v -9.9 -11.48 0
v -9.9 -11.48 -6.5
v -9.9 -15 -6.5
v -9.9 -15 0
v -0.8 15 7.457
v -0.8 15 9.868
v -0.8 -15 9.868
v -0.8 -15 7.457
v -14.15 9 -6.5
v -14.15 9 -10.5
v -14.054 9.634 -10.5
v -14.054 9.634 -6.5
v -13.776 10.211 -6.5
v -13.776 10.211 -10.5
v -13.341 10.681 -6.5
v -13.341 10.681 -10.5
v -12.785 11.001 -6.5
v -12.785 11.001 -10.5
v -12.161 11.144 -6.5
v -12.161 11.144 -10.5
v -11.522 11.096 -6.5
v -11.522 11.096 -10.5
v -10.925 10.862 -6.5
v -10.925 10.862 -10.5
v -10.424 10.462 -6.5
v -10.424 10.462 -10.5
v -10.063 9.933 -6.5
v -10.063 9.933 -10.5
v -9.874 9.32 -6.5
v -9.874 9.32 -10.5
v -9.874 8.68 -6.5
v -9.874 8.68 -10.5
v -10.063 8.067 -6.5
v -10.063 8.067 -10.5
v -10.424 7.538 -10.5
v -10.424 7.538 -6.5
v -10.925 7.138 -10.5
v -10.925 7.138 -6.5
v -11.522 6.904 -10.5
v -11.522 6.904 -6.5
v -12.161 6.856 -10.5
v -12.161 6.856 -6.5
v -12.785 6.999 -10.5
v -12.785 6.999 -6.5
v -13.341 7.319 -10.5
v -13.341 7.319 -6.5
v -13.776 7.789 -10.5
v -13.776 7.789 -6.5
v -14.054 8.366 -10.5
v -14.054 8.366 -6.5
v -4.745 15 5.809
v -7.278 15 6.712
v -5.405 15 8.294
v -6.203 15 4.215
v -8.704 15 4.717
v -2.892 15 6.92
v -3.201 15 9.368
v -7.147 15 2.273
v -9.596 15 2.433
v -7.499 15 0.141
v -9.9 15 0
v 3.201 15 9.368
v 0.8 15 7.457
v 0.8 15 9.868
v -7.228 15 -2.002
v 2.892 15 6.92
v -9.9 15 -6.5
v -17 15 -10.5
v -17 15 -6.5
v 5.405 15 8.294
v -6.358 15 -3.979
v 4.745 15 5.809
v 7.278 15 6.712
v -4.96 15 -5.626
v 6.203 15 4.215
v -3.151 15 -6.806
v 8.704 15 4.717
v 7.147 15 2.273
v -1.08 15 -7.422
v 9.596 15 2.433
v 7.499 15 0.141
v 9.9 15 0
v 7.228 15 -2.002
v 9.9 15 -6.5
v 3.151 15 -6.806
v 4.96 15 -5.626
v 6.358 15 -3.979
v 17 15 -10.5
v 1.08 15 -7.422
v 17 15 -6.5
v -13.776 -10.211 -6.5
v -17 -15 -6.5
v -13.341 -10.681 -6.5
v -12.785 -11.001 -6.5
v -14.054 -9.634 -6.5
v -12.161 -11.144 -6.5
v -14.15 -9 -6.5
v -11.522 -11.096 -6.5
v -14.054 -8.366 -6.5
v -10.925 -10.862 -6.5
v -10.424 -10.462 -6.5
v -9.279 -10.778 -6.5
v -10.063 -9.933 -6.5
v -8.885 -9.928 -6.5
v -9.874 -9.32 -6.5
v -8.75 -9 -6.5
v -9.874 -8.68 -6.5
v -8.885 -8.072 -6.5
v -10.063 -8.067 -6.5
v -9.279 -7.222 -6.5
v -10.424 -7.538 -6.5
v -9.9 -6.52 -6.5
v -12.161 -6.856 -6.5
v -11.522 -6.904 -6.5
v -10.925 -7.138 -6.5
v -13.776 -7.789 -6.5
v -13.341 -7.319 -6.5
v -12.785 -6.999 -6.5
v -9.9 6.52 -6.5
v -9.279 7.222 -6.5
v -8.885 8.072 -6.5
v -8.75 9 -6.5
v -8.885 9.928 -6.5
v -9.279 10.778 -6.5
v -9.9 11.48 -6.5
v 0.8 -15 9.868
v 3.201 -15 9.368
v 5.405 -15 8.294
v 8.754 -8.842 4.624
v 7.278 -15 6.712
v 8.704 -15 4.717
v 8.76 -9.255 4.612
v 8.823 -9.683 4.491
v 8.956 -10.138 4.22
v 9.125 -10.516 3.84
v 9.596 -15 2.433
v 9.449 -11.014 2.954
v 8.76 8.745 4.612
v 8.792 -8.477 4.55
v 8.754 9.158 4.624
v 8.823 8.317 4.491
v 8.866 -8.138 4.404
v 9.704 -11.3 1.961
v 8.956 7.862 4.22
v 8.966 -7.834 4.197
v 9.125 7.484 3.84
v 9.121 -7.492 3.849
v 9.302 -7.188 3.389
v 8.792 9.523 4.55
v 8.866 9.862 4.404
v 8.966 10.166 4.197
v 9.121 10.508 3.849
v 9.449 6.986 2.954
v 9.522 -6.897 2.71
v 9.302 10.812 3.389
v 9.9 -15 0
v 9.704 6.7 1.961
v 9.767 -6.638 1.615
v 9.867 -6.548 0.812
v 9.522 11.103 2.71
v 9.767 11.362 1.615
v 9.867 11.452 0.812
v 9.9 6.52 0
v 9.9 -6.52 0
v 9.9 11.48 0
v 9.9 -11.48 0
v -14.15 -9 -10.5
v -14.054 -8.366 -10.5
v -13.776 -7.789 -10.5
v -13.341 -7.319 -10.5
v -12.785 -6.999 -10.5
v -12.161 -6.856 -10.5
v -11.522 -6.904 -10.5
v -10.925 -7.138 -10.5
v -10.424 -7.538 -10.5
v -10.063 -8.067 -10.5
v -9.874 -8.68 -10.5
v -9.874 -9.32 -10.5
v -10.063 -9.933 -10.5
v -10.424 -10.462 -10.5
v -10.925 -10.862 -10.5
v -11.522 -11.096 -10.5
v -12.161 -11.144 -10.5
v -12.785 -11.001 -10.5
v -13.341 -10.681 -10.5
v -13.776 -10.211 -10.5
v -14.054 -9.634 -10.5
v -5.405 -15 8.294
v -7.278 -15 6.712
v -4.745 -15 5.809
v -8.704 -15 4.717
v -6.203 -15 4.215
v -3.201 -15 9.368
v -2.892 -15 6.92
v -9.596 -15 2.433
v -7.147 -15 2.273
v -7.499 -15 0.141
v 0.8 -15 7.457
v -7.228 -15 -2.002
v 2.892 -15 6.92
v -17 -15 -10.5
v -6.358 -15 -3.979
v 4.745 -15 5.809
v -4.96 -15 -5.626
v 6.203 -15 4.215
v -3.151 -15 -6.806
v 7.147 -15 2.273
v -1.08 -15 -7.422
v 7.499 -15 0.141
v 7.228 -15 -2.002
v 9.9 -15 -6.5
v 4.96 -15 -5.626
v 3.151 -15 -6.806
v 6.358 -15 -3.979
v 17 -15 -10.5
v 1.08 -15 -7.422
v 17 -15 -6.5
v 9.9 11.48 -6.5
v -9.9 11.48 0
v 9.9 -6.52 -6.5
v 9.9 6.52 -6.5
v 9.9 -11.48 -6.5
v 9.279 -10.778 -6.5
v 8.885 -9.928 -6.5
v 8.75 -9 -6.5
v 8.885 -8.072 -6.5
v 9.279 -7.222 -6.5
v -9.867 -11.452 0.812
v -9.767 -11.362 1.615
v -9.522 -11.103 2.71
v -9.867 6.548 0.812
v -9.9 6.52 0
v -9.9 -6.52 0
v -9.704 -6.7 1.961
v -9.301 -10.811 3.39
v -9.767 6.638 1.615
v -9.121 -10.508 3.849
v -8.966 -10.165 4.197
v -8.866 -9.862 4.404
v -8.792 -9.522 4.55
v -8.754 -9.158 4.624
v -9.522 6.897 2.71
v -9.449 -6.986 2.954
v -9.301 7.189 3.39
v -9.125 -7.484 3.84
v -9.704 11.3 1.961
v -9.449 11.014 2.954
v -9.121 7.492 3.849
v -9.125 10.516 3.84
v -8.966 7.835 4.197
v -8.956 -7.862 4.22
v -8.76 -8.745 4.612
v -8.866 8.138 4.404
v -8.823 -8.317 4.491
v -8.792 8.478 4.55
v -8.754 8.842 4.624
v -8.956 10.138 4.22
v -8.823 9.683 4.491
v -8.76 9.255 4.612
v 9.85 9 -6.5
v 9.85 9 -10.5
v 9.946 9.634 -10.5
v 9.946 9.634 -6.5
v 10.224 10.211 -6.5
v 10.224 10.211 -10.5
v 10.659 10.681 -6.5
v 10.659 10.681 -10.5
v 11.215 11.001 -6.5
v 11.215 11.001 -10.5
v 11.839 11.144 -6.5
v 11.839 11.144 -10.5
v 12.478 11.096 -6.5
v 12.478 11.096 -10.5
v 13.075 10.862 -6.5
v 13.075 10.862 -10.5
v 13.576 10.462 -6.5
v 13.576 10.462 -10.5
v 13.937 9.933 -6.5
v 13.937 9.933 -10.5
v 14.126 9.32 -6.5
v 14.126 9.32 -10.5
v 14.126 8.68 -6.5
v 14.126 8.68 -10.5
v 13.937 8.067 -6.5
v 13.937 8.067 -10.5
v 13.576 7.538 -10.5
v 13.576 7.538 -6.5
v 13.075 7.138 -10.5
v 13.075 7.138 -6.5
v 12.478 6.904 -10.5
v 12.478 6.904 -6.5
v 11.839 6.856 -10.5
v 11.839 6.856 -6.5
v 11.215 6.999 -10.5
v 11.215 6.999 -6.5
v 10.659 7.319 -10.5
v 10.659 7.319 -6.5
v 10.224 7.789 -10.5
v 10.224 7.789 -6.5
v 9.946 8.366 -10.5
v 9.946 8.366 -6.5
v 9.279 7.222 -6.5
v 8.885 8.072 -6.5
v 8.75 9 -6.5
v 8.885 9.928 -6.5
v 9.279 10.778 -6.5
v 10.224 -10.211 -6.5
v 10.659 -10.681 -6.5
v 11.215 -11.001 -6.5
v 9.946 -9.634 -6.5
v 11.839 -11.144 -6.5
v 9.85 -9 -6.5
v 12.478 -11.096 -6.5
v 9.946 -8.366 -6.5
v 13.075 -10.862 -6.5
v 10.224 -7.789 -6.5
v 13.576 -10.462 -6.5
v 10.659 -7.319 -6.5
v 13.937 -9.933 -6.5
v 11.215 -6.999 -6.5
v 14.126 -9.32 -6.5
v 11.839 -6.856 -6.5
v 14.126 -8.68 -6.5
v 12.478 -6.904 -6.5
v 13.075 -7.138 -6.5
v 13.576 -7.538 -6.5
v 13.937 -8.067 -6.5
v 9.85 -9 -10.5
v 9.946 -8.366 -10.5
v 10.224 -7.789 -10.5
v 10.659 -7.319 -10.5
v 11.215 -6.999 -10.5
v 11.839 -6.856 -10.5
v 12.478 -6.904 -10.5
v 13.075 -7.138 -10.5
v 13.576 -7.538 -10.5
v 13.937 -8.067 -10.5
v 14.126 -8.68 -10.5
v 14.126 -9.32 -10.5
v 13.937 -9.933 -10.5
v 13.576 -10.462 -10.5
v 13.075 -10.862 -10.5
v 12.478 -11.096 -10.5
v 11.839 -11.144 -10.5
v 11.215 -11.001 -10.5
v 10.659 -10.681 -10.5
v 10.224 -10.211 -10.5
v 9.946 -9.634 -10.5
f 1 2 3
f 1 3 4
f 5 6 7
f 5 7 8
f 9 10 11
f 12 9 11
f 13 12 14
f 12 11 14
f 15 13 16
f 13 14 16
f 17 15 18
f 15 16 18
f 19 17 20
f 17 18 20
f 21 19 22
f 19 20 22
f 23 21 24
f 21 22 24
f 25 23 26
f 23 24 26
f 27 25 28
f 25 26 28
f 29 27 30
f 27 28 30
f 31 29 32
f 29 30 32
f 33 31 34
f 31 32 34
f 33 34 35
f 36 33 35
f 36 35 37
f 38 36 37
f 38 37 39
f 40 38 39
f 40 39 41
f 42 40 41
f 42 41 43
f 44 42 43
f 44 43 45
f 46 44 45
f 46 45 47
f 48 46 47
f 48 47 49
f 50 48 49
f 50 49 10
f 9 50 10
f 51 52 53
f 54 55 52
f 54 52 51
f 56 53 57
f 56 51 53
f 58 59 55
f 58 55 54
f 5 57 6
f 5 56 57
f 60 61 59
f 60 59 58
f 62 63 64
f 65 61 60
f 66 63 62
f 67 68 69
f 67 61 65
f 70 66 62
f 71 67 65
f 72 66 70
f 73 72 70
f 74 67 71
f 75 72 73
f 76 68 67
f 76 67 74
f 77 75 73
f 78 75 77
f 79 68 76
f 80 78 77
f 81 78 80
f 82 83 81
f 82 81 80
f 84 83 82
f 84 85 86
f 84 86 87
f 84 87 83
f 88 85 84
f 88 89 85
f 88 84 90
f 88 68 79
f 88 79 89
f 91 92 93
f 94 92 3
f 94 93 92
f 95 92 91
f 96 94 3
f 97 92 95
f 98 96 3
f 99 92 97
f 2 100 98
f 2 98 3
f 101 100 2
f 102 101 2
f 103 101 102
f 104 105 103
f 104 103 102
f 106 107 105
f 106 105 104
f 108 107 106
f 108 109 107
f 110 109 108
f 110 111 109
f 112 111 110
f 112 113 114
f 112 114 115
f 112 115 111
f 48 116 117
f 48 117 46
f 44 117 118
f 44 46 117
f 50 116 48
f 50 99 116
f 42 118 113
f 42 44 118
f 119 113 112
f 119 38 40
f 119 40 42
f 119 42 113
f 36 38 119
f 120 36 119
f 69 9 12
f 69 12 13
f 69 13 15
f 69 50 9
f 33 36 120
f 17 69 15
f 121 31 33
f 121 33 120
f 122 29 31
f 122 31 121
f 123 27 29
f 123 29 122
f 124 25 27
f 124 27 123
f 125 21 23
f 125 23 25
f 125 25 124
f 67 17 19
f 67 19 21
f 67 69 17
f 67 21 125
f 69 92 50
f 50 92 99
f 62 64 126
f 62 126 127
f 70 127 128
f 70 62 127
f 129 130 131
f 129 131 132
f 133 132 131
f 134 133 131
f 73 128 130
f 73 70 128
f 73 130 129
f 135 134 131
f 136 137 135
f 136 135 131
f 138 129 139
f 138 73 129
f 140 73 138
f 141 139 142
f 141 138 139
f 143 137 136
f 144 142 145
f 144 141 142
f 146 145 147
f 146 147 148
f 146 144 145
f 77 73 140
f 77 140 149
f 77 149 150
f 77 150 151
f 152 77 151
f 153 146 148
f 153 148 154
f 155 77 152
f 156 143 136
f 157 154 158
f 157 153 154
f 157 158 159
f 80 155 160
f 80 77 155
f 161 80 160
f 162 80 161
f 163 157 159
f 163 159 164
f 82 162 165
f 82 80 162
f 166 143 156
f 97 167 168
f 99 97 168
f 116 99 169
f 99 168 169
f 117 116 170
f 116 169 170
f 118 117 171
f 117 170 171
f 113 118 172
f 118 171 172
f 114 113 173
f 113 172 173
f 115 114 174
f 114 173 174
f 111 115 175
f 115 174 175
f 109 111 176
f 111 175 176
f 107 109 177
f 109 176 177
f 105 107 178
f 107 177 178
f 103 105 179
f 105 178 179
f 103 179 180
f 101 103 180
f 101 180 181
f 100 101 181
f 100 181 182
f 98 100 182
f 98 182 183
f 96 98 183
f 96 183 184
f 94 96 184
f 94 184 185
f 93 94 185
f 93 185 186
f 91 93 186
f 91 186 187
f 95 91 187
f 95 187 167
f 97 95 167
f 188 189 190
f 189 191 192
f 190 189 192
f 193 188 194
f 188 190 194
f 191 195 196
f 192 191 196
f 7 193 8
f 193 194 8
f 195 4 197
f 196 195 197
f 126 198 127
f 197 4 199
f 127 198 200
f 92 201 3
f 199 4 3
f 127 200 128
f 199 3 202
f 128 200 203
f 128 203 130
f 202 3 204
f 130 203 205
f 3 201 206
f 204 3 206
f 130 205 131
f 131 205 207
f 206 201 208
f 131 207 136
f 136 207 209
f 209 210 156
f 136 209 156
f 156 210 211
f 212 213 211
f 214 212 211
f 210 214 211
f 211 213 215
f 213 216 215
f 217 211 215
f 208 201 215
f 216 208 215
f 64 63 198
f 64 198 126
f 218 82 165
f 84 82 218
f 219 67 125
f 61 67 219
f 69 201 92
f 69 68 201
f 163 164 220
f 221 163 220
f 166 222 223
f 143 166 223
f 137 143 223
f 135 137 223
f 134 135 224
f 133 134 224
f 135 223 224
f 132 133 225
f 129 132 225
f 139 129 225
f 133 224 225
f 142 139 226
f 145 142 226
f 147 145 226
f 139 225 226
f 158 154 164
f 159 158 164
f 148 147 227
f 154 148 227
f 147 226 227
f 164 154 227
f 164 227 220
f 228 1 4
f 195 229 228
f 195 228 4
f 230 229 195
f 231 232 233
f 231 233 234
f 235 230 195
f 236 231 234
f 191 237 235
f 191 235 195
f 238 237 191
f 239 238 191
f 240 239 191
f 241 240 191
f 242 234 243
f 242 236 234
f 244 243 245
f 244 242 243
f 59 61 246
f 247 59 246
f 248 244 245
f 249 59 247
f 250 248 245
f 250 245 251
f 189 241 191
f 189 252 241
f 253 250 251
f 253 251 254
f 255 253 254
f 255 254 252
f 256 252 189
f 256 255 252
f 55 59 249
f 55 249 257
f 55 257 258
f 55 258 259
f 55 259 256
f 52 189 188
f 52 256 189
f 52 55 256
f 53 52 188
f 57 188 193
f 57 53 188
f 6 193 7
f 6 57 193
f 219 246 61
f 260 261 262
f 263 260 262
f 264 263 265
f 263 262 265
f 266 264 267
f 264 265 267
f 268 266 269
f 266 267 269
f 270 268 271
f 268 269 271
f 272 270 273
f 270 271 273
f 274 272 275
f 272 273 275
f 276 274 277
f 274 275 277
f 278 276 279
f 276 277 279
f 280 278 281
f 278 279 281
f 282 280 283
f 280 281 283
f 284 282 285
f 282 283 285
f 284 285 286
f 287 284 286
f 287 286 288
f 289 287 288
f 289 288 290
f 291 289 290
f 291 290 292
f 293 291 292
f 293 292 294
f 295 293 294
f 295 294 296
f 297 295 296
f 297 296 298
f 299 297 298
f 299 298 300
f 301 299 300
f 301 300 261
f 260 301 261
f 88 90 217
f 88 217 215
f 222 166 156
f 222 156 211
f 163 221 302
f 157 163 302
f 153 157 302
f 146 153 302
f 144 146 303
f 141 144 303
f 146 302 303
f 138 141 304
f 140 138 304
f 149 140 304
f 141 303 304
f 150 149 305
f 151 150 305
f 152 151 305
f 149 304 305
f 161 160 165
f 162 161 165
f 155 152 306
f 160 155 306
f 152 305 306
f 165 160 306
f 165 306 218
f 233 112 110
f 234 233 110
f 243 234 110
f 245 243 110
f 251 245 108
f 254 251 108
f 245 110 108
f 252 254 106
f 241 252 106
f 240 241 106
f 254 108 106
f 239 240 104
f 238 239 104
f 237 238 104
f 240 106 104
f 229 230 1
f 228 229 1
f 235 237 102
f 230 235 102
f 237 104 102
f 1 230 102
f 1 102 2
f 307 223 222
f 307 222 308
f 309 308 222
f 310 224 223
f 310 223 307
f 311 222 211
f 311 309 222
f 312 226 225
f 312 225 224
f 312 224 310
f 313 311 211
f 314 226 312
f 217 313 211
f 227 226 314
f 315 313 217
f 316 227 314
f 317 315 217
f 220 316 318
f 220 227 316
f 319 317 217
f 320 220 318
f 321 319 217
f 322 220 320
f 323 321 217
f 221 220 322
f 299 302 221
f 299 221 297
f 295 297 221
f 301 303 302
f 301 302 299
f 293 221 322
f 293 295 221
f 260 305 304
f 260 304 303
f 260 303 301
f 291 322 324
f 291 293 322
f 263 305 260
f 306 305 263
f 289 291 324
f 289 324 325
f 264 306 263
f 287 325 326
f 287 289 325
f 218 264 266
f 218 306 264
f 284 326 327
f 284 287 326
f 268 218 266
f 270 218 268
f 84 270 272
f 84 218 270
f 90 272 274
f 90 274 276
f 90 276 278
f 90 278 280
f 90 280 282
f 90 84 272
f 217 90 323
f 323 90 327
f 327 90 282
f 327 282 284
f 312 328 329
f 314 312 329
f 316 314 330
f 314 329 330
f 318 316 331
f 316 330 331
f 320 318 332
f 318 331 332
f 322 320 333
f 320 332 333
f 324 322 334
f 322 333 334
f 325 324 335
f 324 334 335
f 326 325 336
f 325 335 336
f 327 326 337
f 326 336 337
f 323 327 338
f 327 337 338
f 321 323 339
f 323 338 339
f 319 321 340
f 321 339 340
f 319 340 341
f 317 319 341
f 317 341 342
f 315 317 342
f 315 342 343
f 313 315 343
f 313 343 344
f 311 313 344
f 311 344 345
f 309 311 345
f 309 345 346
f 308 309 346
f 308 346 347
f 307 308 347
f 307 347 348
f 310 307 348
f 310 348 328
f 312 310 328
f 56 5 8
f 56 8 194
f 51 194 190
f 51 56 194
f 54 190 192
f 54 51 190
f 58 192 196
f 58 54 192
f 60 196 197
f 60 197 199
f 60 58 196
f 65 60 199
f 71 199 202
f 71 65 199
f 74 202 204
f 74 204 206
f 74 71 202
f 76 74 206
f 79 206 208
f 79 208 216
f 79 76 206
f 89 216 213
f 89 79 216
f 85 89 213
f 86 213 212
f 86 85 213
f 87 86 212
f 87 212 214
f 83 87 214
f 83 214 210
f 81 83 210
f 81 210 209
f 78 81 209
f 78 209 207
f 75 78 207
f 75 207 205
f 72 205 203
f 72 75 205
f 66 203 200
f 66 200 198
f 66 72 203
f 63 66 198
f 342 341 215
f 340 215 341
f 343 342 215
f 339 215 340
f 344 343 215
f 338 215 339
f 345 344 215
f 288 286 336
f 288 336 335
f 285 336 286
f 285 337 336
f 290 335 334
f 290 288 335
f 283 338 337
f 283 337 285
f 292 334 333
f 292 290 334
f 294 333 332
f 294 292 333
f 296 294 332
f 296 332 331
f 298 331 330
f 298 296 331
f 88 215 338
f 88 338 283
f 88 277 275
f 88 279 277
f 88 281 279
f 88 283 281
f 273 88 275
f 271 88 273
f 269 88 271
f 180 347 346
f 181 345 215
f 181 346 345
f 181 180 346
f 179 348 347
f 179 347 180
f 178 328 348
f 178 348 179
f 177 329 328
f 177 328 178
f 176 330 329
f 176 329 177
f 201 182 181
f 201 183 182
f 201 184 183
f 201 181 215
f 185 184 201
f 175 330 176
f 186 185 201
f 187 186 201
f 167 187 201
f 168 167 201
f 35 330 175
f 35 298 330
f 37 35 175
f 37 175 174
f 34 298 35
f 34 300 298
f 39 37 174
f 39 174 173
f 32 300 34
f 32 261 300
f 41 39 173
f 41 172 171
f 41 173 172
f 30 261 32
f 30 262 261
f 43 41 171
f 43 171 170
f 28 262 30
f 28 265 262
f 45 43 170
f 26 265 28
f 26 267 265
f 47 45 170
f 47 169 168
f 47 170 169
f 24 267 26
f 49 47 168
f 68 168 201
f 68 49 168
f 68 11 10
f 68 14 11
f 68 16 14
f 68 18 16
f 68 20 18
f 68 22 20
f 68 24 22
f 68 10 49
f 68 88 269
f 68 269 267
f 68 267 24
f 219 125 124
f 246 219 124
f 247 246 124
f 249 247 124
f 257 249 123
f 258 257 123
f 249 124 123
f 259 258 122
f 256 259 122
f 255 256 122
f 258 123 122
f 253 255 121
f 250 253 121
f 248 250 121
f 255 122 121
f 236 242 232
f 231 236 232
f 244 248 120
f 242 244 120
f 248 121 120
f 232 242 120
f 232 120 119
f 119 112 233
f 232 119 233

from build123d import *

# Parameters (mm, degrees)
BOSS_EXTRUDE1_DEPTH      = 15
BOSS_EXTRUDE1_DEPTH_BACK = 15
CUT_EXTRUDE1_REACH       = 22.368
SKETCH2_R                = 2.15
CUT_EXTRUDE2_REACH       = 26.368
CUT_EXTRUDE2_START       = -4
SKETCH3_R                = 3.25


with BuildPart() as part:
    # Sketch1 → Boss-Extrude1 (new body, two sides)
    with BuildSketch(Plane(origin=(0, 0, 0), x_dir=(1, 0, 0), z_dir=(0, 1, 0))) as boss_extrude1_sk:
        with BuildLine():
            Line((-9.9, 6.5), (-9.9, 0))
            ThreePointArc((-9.9, 0), (-7.277705682, -6.711557196), (-0.8, -9.867623827))
            Line((-0.8, -9.867623827), (-0.8, -7.457211275))
            ThreePointArc((-0.8, -7.457211275), (0, 7.5), (0.8, -7.457211275))
            Line((0.8, -7.457211275), (0.8, -9.867623827))
            ThreePointArc((0.8, -9.867623827), (7.277705682, -6.711557196), (9.9, 0))
            Line((9.9, 0), (9.9, 6.5))
            Line((9.9, 6.5), (17, 6.5))
            Line((17, 6.5), (17, 10.5))
            Line((17, 10.5), (-17, 10.5))
            Line((-17, 10.5), (-17, 6.5))
            Line((-17, 6.5), (-9.9, 6.5))
        make_face()
    extrude(amount=BOSS_EXTRUDE1_DEPTH)
    extrude(boss_extrude1_sk.sketch, amount=-BOSS_EXTRUDE1_DEPTH_BACK)

    # Sketch2 → Cut-Extrude1 (cut, up to next)
    with BuildSketch(Plane(origin=(0, 0, -10.5), x_dir=(-1, 0, 0), z_dir=(0, 0, -1)), mode=Mode.PRIVATE) as cut_extrude1_sk1:
        with Locations((12, -9)):
            Circle(SKETCH2_R)
    cut_extrude1_tool1 = extrude(cut_extrude1_sk1.sketch, amount=-CUT_EXTRUDE1_REACH, mode=Mode.PRIVATE) & part.part
    add(cut_extrude1_tool1.solids().sort_by_distance((-12, -9, -10.5))[0], mode=Mode.SUBTRACT)
    # Sketch2 → Cut-Extrude1 (cut, up to next)
    with BuildSketch(Plane(origin=(0, 0, -10.5), x_dir=(-1, 0, 0), z_dir=(0, 0, -1)), mode=Mode.PRIVATE) as cut_extrude1_sk2:
        with Locations((-12, -9)):
            Circle(SKETCH2_R)
    cut_extrude1_tool2 = extrude(cut_extrude1_sk2.sketch, amount=-CUT_EXTRUDE1_REACH, mode=Mode.PRIVATE) & part.part
    add(cut_extrude1_tool2.solids().sort_by_distance((12, -9, -10.5))[0], mode=Mode.SUBTRACT)
    # Sketch2 → Cut-Extrude1 (cut, up to next)
    with BuildSketch(Plane(origin=(0, 0, -10.5), x_dir=(-1, 0, 0), z_dir=(0, 0, -1)), mode=Mode.PRIVATE) as cut_extrude1_sk3:
        with Locations((-12, 9)):
            Circle(SKETCH2_R)
    cut_extrude1_tool3 = extrude(cut_extrude1_sk3.sketch, amount=-CUT_EXTRUDE1_REACH, mode=Mode.PRIVATE) & part.part
    add(cut_extrude1_tool3.solids().sort_by_distance((12, 9, -10.5))[0], mode=Mode.SUBTRACT)
    # Sketch2 → Cut-Extrude1 (cut, up to next)
    with BuildSketch(Plane(origin=(0, 0, -10.5), x_dir=(-1, 0, 0), z_dir=(0, 0, -1)), mode=Mode.PRIVATE) as cut_extrude1_sk4:
        with Locations((12, 9)):
            Circle(SKETCH2_R)
    cut_extrude1_tool4 = extrude(cut_extrude1_sk4.sketch, amount=-CUT_EXTRUDE1_REACH, mode=Mode.PRIVATE) & part.part
    add(cut_extrude1_tool4.solids().sort_by_distance((-12, 9, -10.5))[0], mode=Mode.SUBTRACT)

    # Sketch3 → Cut-Extrude2 (cut, up to next)
    with BuildSketch(Plane(origin=(0, 0, -10.5), x_dir=(-1, 0, 0), z_dir=(0, 0, -1)).offset(CUT_EXTRUDE2_START), mode=Mode.PRIVATE) as cut_extrude2_sk1:
        with Locations((-12, 9)):
            Circle(SKETCH3_R)
    cut_extrude2_tool1 = extrude(cut_extrude2_sk1.sketch, amount=-CUT_EXTRUDE2_REACH, mode=Mode.PRIVATE) & part.part
    add(cut_extrude2_tool1.solids().sort_by_distance((12, 9, -6.5))[0], mode=Mode.SUBTRACT)
    # Sketch3 → Cut-Extrude2 (cut, up to next)
    with BuildSketch(Plane(origin=(0, 0, -10.5), x_dir=(-1, 0, 0), z_dir=(0, 0, -1)).offset(CUT_EXTRUDE2_START), mode=Mode.PRIVATE) as cut_extrude2_sk2:
        with Locations((-12, -9)):
            Circle(SKETCH3_R)
    cut_extrude2_tool2 = extrude(cut_extrude2_sk2.sketch, amount=-CUT_EXTRUDE2_REACH, mode=Mode.PRIVATE) & part.part
    add(cut_extrude2_tool2.solids().sort_by_distance((12, -9, -6.5))[0], mode=Mode.SUBTRACT)
    # Sketch3 → Cut-Extrude2 (cut, up to next)
    with BuildSketch(Plane(origin=(0, 0, -10.5), x_dir=(-1, 0, 0), z_dir=(0, 0, -1)).offset(CUT_EXTRUDE2_START), mode=Mode.PRIVATE) as cut_extrude2_sk3:
        with Locations((12, 9)):
            Circle(SKETCH3_R)
    cut_extrude2_tool3 = extrude(cut_extrude2_sk3.sketch, amount=-CUT_EXTRUDE2_REACH, mode=Mode.PRIVATE) & part.part
    add(cut_extrude2_tool3.solids().sort_by_distance((-12, 9, -6.5))[0], mode=Mode.SUBTRACT)
    # Sketch3 → Cut-Extrude2 (cut, up to next)
    with BuildSketch(Plane(origin=(0, 0, -10.5), x_dir=(-1, 0, 0), z_dir=(0, 0, -1)).offset(CUT_EXTRUDE2_START), mode=Mode.PRIVATE) as cut_extrude2_sk4:
        with Locations((12, -9)):
            Circle(SKETCH3_R)
    cut_extrude2_tool4 = extrude(cut_extrude2_sk4.sketch, amount=-CUT_EXTRUDE2_REACH, mode=Mode.PRIVATE) & part.part
    add(cut_extrude2_tool4.solids().sort_by_distance((-12, -9, -6.5))[0], mode=Mode.SUBTRACT)


solid = part.part
